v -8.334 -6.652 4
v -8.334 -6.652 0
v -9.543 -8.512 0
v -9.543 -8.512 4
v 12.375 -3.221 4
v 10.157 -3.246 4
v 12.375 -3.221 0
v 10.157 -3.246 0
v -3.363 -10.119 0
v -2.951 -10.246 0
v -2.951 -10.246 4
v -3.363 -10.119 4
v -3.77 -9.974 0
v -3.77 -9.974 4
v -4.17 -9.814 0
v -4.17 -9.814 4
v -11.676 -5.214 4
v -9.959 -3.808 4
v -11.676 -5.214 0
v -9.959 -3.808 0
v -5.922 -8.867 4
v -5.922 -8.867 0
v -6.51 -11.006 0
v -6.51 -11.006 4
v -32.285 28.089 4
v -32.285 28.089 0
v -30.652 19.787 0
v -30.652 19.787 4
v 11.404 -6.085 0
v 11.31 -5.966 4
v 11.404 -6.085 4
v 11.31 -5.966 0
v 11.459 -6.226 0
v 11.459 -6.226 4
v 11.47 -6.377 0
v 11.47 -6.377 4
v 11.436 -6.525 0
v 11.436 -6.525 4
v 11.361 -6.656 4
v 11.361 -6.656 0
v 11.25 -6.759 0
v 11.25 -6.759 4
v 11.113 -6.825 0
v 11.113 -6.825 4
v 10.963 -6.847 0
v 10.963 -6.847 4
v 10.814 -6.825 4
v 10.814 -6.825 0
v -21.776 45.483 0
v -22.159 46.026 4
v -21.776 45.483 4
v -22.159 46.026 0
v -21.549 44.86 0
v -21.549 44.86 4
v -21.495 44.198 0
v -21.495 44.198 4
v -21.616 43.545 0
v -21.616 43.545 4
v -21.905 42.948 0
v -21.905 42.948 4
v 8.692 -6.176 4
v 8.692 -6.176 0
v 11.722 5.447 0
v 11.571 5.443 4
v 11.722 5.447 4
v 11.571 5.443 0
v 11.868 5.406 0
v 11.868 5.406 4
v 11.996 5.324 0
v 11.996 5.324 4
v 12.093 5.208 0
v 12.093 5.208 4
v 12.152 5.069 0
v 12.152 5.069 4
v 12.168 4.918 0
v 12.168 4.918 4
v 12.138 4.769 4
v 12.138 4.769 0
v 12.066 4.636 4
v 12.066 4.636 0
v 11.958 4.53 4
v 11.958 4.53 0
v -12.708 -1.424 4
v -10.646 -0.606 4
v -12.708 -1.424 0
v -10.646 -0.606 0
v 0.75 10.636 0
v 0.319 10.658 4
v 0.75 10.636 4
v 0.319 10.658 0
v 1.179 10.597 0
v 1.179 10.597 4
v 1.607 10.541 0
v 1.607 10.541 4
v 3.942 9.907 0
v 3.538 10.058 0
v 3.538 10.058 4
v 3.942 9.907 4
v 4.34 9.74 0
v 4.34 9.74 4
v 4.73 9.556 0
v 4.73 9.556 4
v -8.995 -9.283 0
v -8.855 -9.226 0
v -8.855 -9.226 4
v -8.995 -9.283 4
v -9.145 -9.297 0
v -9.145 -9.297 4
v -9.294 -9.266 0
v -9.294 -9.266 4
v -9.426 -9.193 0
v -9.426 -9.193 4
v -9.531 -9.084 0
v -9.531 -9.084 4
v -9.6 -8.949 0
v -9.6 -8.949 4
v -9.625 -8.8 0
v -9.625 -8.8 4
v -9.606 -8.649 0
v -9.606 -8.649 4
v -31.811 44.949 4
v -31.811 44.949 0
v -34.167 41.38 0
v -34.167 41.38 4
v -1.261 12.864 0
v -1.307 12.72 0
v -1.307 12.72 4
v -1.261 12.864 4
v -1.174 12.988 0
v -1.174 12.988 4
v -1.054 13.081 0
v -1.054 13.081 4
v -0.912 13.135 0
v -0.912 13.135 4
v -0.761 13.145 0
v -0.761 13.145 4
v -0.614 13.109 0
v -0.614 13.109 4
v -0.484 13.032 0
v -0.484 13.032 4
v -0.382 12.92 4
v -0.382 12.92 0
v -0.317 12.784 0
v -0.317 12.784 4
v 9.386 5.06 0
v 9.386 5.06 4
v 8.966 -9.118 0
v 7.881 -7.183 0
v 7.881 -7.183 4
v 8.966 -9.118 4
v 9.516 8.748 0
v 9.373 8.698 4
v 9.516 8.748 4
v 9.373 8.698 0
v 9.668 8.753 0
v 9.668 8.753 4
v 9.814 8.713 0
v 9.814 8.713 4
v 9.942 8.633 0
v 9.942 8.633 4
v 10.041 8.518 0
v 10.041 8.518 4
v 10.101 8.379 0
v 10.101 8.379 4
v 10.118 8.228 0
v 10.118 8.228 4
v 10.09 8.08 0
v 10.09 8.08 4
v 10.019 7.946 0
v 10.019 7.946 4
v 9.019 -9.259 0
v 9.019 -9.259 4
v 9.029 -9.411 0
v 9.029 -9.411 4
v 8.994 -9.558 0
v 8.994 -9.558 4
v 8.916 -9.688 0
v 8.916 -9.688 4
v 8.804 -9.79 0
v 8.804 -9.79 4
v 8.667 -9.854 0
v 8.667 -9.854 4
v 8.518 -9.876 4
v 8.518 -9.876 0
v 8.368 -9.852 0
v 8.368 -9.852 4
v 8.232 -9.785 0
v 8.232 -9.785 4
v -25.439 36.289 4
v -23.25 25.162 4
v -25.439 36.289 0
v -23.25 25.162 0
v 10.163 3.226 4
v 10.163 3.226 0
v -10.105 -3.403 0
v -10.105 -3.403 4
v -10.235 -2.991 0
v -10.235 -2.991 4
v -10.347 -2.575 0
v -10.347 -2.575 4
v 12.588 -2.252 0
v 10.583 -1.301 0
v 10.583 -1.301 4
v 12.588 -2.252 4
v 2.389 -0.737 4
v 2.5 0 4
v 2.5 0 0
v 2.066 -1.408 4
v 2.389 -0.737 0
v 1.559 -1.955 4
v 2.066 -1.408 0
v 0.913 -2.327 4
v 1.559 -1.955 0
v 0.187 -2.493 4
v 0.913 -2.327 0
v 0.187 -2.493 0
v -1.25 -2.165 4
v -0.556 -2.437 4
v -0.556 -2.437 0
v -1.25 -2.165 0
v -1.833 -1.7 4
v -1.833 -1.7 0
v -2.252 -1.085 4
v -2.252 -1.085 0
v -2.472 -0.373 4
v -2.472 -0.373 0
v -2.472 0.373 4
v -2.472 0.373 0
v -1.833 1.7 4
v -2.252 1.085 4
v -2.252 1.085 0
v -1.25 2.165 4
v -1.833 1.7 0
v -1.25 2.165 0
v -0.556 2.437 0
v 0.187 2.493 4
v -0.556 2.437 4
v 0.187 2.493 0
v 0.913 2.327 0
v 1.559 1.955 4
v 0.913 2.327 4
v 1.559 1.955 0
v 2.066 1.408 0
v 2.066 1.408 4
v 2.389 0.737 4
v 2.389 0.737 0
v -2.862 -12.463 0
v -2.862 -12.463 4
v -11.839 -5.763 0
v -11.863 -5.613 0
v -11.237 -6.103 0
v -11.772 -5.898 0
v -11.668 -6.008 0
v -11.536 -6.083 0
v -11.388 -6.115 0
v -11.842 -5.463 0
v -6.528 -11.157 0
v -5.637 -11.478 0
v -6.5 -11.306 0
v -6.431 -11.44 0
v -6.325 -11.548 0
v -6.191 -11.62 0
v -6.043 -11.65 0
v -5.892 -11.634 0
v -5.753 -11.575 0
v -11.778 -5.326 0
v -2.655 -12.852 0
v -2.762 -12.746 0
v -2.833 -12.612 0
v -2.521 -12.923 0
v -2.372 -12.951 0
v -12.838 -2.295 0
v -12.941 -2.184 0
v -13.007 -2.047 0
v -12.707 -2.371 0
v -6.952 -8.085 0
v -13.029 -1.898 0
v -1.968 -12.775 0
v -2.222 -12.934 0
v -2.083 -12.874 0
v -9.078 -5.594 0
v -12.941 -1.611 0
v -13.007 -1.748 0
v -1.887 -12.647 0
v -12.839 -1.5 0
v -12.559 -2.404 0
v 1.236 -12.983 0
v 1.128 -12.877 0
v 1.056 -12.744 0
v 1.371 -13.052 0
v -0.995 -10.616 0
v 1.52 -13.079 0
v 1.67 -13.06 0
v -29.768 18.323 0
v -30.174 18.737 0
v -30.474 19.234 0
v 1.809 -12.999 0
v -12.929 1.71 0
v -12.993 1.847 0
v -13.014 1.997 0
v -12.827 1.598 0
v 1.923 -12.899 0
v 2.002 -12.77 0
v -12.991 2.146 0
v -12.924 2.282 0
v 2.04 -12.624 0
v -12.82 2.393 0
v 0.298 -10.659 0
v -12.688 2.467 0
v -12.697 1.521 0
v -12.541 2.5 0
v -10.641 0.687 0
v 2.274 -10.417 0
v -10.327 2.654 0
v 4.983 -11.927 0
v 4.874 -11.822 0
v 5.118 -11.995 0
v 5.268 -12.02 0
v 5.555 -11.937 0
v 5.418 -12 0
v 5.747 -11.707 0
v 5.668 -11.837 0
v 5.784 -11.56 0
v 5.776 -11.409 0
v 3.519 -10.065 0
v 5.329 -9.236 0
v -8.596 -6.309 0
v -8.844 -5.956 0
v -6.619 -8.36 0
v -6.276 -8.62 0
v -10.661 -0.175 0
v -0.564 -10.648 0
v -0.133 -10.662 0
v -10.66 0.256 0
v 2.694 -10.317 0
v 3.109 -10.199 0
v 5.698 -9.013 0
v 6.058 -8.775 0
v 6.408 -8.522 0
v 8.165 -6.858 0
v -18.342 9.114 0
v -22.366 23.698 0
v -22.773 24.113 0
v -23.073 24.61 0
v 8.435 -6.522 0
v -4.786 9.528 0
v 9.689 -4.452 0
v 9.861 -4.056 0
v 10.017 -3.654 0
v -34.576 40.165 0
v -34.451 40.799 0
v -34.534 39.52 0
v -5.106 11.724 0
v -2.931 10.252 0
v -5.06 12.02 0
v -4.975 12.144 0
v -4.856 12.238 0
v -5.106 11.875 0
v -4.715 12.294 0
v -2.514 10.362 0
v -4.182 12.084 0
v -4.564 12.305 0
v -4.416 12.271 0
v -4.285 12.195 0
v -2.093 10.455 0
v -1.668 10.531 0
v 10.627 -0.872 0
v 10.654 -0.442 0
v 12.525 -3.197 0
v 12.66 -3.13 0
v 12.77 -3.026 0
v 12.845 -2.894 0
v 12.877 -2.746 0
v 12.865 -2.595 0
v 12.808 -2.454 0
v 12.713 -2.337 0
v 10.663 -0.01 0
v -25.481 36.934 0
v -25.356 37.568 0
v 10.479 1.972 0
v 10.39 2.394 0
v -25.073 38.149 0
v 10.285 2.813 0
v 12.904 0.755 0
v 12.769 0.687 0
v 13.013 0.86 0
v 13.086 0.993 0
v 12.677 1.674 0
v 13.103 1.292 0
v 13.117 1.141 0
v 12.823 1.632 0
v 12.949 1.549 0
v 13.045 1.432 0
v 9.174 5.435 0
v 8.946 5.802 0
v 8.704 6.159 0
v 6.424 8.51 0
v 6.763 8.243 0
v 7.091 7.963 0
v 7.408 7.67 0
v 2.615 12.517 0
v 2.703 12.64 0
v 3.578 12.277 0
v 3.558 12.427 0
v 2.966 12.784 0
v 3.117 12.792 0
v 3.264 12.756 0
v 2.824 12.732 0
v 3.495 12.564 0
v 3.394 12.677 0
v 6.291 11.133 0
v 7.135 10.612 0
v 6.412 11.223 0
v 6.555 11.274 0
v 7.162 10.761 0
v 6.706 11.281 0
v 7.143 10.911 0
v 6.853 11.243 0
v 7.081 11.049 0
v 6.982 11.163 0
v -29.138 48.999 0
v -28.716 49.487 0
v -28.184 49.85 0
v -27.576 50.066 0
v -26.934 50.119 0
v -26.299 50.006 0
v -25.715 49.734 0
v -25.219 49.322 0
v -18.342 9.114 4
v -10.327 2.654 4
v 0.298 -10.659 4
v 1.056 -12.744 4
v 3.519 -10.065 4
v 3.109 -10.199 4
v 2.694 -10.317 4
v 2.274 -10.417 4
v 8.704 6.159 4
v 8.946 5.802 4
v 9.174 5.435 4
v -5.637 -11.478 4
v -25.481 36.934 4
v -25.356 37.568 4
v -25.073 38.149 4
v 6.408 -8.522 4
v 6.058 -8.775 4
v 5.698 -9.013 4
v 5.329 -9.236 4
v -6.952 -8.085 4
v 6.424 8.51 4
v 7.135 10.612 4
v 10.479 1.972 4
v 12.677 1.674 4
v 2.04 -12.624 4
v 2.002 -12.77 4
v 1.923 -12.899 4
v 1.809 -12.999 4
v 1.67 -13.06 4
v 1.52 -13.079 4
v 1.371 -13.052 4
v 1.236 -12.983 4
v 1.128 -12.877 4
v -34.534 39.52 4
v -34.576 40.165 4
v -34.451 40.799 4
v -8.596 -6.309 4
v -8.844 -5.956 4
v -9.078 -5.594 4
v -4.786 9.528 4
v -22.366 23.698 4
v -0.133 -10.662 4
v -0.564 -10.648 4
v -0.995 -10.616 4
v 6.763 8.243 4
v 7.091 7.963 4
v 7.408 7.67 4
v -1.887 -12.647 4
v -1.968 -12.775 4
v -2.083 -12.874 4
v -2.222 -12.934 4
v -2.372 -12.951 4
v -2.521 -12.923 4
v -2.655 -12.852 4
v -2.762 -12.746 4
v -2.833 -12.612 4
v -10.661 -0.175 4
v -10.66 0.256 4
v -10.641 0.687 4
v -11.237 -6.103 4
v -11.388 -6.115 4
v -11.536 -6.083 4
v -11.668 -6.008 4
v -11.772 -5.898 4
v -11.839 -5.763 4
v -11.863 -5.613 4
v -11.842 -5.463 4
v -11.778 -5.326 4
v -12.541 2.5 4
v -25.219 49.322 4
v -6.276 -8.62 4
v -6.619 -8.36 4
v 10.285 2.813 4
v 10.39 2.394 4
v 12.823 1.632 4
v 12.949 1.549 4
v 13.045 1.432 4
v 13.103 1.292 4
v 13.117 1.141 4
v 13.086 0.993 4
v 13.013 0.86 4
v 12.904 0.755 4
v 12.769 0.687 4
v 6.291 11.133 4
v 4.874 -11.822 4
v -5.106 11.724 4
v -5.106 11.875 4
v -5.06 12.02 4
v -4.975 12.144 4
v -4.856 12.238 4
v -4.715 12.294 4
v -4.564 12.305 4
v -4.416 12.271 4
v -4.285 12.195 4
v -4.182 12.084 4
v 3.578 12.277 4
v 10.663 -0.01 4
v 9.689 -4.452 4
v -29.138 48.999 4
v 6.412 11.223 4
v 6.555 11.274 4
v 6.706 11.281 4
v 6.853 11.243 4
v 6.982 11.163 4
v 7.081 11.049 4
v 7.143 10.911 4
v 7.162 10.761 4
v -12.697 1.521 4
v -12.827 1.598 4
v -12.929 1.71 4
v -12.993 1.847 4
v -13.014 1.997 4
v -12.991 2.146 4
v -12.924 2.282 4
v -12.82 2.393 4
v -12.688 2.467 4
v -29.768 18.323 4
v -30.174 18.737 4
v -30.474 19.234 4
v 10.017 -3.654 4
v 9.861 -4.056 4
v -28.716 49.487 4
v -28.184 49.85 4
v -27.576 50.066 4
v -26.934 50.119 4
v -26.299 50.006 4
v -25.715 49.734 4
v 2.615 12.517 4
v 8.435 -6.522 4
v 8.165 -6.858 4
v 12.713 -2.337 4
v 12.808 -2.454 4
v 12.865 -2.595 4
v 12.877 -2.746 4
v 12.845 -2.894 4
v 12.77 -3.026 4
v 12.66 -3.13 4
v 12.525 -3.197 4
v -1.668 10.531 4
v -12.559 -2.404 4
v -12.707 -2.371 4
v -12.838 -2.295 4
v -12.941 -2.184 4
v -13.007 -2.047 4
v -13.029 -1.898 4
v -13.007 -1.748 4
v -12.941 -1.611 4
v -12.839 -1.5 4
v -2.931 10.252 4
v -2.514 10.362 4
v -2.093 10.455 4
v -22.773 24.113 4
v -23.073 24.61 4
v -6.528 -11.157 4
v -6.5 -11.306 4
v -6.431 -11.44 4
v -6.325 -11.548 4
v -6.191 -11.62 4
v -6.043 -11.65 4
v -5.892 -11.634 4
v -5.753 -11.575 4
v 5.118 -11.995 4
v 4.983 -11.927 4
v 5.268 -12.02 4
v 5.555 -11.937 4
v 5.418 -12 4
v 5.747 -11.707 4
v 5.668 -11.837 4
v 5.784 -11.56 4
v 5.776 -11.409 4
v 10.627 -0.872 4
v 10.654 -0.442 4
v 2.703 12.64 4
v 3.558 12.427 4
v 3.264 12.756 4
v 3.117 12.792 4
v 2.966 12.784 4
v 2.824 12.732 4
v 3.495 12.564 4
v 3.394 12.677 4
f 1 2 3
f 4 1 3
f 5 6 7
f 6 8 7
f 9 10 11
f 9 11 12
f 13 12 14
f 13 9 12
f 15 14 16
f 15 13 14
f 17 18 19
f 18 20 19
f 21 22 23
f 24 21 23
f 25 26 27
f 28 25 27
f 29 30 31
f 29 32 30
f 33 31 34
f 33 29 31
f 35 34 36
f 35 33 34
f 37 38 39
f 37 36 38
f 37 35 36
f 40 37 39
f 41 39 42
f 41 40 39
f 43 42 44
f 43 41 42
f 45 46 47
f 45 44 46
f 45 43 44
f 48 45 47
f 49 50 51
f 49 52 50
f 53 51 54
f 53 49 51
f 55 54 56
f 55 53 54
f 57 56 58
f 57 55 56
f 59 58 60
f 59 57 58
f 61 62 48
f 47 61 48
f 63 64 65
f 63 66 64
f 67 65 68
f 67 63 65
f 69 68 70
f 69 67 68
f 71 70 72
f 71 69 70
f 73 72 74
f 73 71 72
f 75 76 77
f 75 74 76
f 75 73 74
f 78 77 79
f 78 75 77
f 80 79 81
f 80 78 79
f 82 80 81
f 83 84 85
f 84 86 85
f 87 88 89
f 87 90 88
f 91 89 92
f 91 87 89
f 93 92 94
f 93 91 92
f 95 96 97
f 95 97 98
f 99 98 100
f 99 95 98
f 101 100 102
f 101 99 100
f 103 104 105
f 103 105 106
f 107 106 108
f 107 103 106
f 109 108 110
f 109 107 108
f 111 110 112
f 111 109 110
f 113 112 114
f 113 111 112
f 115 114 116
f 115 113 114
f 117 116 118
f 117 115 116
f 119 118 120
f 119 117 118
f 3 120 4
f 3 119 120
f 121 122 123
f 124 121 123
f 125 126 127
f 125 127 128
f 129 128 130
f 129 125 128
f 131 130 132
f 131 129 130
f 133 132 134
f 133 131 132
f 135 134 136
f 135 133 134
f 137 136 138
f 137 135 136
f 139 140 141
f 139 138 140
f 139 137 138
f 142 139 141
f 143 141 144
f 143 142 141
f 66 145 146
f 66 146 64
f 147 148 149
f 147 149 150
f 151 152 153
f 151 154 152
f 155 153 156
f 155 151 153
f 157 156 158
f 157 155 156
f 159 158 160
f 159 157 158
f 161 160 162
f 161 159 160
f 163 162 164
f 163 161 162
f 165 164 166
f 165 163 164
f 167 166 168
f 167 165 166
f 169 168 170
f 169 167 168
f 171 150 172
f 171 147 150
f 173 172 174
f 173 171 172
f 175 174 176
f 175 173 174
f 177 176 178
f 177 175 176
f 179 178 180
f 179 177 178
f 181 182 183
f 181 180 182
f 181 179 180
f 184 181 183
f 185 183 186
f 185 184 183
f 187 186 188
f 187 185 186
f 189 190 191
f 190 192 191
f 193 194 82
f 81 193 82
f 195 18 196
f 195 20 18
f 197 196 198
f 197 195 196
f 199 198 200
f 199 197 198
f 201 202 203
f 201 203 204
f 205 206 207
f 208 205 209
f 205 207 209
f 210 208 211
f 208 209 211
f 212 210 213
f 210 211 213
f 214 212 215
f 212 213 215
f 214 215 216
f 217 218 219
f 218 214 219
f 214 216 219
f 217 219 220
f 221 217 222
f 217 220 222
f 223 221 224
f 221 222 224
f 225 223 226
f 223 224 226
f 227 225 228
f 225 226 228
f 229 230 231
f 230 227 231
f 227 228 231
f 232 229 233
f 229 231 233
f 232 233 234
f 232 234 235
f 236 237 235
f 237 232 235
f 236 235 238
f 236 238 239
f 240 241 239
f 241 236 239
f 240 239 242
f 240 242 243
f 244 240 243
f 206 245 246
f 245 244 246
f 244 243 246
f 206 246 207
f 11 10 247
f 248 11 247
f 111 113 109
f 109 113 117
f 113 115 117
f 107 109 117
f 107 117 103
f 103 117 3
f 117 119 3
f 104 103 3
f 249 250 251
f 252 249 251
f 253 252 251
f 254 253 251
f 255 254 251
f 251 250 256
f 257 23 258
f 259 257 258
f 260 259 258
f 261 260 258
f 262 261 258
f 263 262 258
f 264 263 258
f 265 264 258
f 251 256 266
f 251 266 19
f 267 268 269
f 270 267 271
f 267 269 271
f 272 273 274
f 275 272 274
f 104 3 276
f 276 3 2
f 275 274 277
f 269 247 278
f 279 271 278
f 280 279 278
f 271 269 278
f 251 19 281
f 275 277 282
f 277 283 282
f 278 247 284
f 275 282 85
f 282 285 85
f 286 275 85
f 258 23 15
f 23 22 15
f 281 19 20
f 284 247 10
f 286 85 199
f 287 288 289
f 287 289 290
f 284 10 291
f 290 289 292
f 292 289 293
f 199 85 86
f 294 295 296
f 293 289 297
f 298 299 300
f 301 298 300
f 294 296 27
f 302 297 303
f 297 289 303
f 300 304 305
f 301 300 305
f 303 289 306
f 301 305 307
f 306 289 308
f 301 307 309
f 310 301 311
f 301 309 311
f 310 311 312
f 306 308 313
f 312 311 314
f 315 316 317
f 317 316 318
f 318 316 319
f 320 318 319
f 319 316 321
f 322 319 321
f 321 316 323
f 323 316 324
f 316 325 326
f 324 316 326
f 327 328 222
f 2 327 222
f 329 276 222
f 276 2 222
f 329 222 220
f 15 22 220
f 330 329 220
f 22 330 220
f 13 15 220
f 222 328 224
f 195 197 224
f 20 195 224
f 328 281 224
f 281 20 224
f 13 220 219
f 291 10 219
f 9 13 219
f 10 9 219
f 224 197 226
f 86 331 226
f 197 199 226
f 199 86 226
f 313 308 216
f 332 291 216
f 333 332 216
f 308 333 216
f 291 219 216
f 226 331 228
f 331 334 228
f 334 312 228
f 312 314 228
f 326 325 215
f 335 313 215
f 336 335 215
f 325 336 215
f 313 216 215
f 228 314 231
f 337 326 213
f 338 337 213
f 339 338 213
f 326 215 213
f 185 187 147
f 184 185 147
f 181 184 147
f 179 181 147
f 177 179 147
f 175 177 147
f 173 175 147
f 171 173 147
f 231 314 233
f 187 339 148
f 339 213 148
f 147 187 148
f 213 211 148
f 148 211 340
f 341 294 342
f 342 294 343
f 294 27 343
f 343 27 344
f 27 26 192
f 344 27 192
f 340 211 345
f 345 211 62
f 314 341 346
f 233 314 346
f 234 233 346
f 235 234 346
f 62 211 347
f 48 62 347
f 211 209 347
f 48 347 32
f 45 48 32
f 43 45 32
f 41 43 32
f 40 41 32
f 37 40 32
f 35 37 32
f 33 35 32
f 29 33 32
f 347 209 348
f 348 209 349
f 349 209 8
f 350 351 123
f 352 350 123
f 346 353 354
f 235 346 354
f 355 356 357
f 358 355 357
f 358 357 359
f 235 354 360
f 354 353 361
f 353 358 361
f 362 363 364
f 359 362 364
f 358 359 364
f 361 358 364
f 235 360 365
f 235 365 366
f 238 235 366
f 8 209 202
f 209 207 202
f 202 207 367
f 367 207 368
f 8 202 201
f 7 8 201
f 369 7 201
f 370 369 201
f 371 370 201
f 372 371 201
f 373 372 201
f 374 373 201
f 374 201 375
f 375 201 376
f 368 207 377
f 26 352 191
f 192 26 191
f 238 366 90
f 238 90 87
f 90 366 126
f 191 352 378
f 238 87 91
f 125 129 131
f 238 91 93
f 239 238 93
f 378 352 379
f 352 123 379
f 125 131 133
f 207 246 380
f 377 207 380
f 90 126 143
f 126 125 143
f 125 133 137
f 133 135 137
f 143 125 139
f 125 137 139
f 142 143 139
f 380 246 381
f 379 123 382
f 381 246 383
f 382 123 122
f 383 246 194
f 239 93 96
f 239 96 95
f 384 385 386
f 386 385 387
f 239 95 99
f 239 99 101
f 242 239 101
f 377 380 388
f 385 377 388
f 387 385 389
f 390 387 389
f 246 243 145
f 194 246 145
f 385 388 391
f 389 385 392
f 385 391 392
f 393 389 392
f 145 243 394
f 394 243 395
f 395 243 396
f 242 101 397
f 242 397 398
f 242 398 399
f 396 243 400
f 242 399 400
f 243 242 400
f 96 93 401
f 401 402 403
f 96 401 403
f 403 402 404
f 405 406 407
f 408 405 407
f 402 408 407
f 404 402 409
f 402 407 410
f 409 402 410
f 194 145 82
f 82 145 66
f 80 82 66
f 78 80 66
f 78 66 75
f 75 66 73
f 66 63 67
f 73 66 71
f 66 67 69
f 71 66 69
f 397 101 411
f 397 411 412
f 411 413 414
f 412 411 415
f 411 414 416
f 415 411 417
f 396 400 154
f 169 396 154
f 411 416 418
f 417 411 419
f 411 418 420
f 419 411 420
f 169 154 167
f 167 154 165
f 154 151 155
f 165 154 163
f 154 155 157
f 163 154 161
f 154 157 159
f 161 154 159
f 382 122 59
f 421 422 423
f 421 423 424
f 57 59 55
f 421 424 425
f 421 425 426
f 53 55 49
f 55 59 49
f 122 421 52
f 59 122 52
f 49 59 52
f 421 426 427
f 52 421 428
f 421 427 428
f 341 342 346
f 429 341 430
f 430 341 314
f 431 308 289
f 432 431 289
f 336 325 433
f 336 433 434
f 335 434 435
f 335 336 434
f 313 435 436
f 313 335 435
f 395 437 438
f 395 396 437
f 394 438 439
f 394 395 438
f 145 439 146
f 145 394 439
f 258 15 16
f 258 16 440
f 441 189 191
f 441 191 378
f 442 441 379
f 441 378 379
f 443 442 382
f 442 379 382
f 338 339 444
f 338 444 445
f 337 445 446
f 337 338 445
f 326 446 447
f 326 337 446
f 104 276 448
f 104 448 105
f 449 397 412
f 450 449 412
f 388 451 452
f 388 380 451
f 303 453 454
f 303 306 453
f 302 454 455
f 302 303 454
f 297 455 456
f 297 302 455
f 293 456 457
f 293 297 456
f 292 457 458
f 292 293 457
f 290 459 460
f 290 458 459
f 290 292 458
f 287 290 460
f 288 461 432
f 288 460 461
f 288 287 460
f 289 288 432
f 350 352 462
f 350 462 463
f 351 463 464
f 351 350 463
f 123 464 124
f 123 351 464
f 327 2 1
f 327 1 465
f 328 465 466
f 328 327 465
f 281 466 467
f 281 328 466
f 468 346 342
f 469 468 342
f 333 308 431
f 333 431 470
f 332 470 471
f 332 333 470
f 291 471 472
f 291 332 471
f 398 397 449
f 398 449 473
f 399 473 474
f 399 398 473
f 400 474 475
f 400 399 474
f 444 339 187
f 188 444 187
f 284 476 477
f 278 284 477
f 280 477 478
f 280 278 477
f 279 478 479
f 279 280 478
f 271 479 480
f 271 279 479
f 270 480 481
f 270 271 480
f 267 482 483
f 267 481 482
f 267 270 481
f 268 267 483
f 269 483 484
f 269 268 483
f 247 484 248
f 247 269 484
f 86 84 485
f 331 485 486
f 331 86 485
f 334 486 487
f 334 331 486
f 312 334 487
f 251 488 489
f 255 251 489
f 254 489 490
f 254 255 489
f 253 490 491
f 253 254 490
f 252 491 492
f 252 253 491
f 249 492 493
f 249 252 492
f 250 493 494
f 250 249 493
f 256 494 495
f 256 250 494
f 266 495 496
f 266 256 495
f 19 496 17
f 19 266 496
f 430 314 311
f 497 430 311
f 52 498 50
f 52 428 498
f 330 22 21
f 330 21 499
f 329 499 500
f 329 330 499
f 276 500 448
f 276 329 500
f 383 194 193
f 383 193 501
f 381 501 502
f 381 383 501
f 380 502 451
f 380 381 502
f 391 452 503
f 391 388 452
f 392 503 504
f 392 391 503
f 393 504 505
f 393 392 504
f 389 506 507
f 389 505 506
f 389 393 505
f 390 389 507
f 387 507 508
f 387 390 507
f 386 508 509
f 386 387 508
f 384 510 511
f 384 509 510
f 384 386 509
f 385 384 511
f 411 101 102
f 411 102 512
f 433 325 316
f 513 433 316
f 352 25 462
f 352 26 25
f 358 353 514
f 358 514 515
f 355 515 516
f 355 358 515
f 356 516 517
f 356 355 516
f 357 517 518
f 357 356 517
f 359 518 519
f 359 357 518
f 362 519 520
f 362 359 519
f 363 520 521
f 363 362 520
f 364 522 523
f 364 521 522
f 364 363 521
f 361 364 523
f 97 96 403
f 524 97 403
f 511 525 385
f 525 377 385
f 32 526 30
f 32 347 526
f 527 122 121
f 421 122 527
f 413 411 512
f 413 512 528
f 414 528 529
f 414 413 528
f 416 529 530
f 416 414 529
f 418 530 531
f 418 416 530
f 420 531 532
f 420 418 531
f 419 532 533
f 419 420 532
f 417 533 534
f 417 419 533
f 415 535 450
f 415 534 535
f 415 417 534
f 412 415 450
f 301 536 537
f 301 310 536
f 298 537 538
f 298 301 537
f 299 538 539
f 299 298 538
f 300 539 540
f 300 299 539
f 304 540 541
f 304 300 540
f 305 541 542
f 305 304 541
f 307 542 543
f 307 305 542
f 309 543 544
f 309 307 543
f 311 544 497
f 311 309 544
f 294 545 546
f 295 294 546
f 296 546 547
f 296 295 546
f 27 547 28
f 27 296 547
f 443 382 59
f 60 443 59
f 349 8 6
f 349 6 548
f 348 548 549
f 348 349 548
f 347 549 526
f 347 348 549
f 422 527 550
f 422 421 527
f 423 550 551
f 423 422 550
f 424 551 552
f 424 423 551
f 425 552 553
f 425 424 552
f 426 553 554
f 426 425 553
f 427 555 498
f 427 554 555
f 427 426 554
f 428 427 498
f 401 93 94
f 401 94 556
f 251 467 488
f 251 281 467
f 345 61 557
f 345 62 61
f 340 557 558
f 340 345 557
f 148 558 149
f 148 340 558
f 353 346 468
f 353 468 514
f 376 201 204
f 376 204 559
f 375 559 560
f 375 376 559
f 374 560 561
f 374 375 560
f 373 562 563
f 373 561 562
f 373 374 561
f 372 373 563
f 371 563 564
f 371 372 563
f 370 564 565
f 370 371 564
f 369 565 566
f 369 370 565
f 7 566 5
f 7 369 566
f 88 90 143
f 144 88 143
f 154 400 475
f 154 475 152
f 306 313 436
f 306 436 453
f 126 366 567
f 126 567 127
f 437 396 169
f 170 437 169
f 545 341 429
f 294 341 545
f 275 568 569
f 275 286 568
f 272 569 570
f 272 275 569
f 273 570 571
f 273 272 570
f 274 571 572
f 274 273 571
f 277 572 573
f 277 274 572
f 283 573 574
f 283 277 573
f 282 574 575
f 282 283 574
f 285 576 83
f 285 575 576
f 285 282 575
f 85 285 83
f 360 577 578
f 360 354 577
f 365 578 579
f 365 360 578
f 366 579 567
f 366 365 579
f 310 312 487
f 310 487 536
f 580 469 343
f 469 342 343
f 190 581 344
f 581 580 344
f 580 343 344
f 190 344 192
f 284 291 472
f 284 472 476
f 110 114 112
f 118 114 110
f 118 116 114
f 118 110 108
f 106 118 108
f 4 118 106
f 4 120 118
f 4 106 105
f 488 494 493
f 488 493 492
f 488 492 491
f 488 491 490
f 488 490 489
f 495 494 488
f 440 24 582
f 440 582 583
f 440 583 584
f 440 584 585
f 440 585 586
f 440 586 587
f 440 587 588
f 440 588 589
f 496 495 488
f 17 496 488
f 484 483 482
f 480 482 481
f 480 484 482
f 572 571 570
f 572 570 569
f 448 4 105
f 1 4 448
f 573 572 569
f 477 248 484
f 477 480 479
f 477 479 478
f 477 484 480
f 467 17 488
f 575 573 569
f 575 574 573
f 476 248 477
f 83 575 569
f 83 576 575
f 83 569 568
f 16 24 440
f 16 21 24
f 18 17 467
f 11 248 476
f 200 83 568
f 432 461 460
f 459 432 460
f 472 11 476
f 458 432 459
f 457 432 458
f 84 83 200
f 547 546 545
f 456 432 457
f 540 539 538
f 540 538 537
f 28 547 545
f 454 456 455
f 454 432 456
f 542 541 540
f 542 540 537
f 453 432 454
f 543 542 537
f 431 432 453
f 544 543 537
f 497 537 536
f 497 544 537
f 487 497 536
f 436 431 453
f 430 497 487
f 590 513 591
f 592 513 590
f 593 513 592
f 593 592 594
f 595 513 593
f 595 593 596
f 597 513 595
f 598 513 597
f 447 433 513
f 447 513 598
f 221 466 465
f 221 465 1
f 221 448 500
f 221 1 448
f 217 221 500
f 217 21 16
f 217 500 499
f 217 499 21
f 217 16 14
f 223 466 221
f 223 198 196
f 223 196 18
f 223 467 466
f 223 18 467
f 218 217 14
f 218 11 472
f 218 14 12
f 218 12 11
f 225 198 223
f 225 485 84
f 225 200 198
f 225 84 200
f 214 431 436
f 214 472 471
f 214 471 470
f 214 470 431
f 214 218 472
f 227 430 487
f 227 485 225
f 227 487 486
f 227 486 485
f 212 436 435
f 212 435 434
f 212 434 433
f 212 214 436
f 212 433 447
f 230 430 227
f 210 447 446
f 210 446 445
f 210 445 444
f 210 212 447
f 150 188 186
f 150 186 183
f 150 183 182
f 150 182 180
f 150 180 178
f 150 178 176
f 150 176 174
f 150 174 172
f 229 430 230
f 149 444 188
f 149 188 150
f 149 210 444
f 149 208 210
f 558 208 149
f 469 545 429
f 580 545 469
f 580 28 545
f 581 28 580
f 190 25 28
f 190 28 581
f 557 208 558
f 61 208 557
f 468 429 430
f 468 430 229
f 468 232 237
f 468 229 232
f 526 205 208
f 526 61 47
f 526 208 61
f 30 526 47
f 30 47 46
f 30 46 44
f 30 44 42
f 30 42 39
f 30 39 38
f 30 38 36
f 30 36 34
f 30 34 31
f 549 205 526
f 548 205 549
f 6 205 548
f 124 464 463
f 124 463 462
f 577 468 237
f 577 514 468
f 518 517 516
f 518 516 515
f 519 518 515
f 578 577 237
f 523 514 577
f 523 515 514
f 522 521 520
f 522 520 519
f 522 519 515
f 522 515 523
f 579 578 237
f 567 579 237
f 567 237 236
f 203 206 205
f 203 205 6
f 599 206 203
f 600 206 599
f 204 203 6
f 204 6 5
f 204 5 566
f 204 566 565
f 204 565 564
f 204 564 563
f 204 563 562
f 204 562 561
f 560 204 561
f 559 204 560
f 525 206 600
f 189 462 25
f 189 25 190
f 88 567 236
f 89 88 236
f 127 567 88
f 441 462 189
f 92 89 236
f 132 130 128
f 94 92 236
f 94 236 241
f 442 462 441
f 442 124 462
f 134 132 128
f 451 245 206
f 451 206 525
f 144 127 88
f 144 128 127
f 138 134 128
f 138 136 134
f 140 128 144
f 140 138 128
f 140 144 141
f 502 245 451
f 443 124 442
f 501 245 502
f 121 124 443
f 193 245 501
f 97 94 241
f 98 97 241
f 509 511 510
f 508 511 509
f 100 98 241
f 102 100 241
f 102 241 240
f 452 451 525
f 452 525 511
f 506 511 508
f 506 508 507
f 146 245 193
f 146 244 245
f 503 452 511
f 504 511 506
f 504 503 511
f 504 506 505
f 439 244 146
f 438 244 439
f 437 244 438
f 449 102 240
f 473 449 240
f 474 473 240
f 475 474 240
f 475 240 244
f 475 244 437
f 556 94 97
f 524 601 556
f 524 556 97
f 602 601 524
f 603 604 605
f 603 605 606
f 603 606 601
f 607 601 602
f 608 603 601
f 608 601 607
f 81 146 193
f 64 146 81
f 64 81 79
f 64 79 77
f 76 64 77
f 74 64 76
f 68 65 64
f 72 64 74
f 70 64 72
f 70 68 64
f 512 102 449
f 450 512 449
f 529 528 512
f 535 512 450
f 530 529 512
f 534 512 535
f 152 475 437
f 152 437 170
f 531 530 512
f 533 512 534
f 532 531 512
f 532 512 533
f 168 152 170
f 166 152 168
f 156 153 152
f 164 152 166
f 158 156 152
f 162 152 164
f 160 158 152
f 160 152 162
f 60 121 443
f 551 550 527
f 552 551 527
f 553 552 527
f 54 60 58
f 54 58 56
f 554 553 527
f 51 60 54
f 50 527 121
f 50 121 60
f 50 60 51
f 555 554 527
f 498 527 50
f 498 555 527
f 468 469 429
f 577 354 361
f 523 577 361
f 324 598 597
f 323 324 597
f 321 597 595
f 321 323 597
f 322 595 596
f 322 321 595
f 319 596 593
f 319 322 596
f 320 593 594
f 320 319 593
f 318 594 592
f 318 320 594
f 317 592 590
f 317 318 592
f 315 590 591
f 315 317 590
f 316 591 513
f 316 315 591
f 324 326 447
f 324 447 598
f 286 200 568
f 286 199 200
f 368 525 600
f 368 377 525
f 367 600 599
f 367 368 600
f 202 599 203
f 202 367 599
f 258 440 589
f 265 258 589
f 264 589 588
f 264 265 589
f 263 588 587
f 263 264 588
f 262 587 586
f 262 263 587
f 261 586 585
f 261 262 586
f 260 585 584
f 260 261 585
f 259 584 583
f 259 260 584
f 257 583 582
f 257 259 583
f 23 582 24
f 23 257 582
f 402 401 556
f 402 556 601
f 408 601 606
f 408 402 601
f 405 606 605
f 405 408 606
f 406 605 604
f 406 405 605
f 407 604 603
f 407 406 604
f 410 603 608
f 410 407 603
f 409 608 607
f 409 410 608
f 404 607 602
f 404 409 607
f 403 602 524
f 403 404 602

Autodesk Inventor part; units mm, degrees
ref_plane "YZ Plane" through (0, 0, 0) normal (1, 0, 0) x (0, 1, 0)
ref_plane "XZ Plane" through (0, 0, 0) normal (0, 1, 0) x (-1, 0, 0)
ref_plane "XY Plane" through (0, 0, 0) normal (0, 0, 1) x (1, 0, 0)
sketch "Sketch1" plane through (0, 0, 0) normal (0, 0, 1) x (1, 0, 0)
  circle A0 centre (0, 0) radius 2.5
  line L0 (0, 0) -> (-15.5714, 12.5511)
  line L1 (0, 0) -> (20, 0) construction
  line L2 (-15.5714, 12.5511) -> (-18.3421, 9.1137)
  line L3 (0, 0) -> (-10.3273, 2.6535)
  line L4 (0, 0) -> (22.7557, 0) construction
  line L5 (0, 0) -> (-10.6628, 0)
  line L6 (-4.786, 9.5283) -> (-22.3661, 23.6985)
  line L7 (-22.3661, 23.6985) -> (-20.7973, 25.6449)
  circle A1 centre (-20.7973, 25.6449) radius 2.5
  line L8 (-18.3421, 9.1137) -> (-10.3273, 2.6535)
  line L9 (-23.2502, 25.1624) -> (-25.4393, 36.2891)
  line L10 (-23.2502, 25.1624) -> (-11.9102, 25.1624) construction
  line L11 (-25.4393, 36.2891) -> (-22.9863, 36.7717)
  circle A2 centre (-22.9863, 36.7717) radius 2.5
  line L12 (-25.0727, 38.149) -> (-21.9049, 42.9477)
  line L13 (-25.0727, 38.149) -> (-19.3227, 38.149) construction
  line L14 (-21.9049, 42.9477) -> (-23.9913, 44.325)
  circle A3 centre (-23.9913, 44.325) radius 2.5
  line L15 (0, 0) -> (60, 0) construction
  line L16 (-25.2189, 49.3225) -> (-22.1589, 46.0257)
  line L17 (-23.9913, 39.7871) -> (-31.8111, 44.9492)
  line L18 (-31.8111, 44.9492) -> (-29.1376, 48.9991)
  line L19 (-31.8111, 44.9492) -> (-34.1674, 41.3798)
  line L20 (-24.1412, 29.6912) -> (-32.2851, 28.089)
  line L21 (-32.2851, 28.089) -> (-34.534, 39.5199)
  line L22 (-32.2851, 28.089) -> (-30.6518, 19.787)
  line L23 (-18.3421, 9.1137) -> (-29.7677, 18.3232)
  line L24 (-18.3421, 20.455) -> (-23.8834, 13.5802)
  arc A4 (-12.5406, 2.5003) -> (-12.6967, 1.5208) centre (-12.5054, 1.9925) ccw
  line L25 (-10.3273, 2.6535) -> (-12.5406, 2.5003)
  line L26 (-10.6406, 0.6873) -> (-12.6967, 1.5208)
  line L27 (-10.6455, -0.6061) -> (-12.7079, -1.4239)
  line L28 (-10.3473, -2.5746) -> (-12.5593, -2.4045)
  arc A5 (-12.7079, -1.4239) -> (-12.5593, -2.4045) centre (-12.5203, -1.897) ccw
  line L29 (-9.9594, -3.8085) -> (-11.6763, -5.2137)
  line L30 (-9.0777, -5.5937) -> (-11.2371, -6.103)
  arc A6 (-11.6763, -5.2137) -> (-11.2371, -6.103) centre (-11.3539, -5.6076) ccw
  line L31 (-8.3337, -6.6517) -> (-9.5431, -8.5116)
  line L32 (-6.9518, -8.085) -> (-8.8547, -9.2257)
  arc A7 (-9.5431, -8.5116) -> (-8.8547, -9.2257) centre (-9.1164, -8.7891) ccw
  line L33 (-5.9217, -8.8672) -> (-6.5096, -11.0065)
  line L34 (-4.17, -9.8136) -> (-5.6369, -11.478)
  arc A8 (-6.5096, -11.0065) -> (-5.6369, -11.478) centre (-6.0188, -11.1414) ccw
  line L35 (-2.951, -10.2463) -> (-2.8619, -12.4631)
  line L36 (-0.9947, -10.6163) -> (-1.8873, -12.6474)
  arc A9 (-2.8619, -12.4631) -> (-1.8873, -12.6474) centre (-2.3533, -12.4426) ccw
  line L37 (0.298, -10.6586) -> (1.0558, -12.7438)
  line L38 (2.2743, -10.4174) -> (2.0403, -12.6236)
  arc A10 (1.0558, -12.7438) -> (2.0403, -12.6236) centre (1.5342, -12.5699) ccw
  line L39 (3.5189, -10.0654) -> (4.8738, -11.8222)
  line L40 (5.3288, -9.2357) -> (5.7755, -11.4089)
  arc A11 (4.8738, -11.8222) -> (5.7755, -11.4089) centre (5.2769, -11.5113) ccw
  line L41 (6.4079, -8.5225) -> (8.2321, -9.7852)
  line L42 (7.8806, -7.1827) -> (8.9658, -9.1178)
  arc A12 (8.2321, -9.7852) -> (8.9658, -9.1178) centre (8.5218, -9.3667) ccw
  line L43 (8.6923, -6.1756) -> (10.8137, -6.8251)
  line L44 (9.6889, -4.452) -> (11.3102, -5.9665)
  arc A13 (10.8137, -6.8251) -> (11.3102, -5.9665) centre (10.9627, -6.3384) ccw
  line L45 (10.1566, -3.2461) -> (12.3751, -3.2211)
  line L46 (10.5831, -1.3013) -> (12.5875, -2.2522)
  arc A14 (12.3751, -3.2211) -> (12.5875, -2.2522) centre (12.3693, -2.7121) ccw
  line L47 (10.6628, -0.0103) -> (12.769, 0.6868)
  line L48 (10.4788, 1.9721) -> (12.6773, 1.6744)
  arc A15 (12.769, 0.6868) -> (12.6773, 1.6744) centre (12.609, 1.17) ccw
  line L49 (10.1629, 3.2264) -> (11.9582, 4.5299)
  line L50 (9.3859, 5.0595) -> (11.5711, 5.4432)
  arc A16 (11.9582, 4.5299) -> (11.5711, 5.4432) centre (11.6591, 4.9418) ccw
  line L51 (8.7043, 6.1588) -> (10.0192, 7.9457)
  line L52 (7.4075, 7.6696) -> (9.3732, 8.6983)
  arc A17 (10.0192, 7.9457) -> (9.3732, 8.6983) centre (9.6092, 8.2474) ccw
  line L53 (6.4244, 8.5101) -> (7.135, 10.6118)
  line L54 (4.7303, 9.5561) -> (6.291, 11.1329)
  arc A18 (7.135, 10.6118) -> (6.291, 11.1329) centre (6.6528, 10.7748) ccw
  line L55 (3.5385, 10.0585) -> (3.5776, 12.2768)
  line L56 (1.6068, 10.541) -> (2.6153, 12.5171)
  arc A19 (3.5776, 12.2768) -> (2.6153, 12.5171) centre (3.0687, 12.2857) ccw
  line L57 (0.3187, 10.658) -> (-0.3173, 12.7835)
  line L58 (-1.6683, 10.5314) -> (-1.3071, 12.7204)
  arc A20 (-0.3173, 12.7835) -> (-1.3071, 12.7204) centre (-0.8049, 12.6376) ccw
  line L59 (-2.9312, 10.252) -> (-4.1823, 12.0842)
  line L60 (-4.786, 9.5283) -> (-5.1063, 11.7237)
  arc A21 (-4.1823, 12.0842) -> (-5.1063, 11.7237) centre (-4.6026, 11.7971) ccw
  arc A22 (-1.6683, 10.5314) -> (-2.9312, 10.252) centre (0, 0) ccw
  arc A23 (1.6068, 10.541) -> (0.3187, 10.658) centre (0, 0) ccw
  arc A24 (4.7303, 9.5561) -> (3.5385, 10.0585) centre (0, 0) ccw
  arc A25 (7.4075, 7.6696) -> (6.4244, 8.5101) centre (0, 0) ccw
  arc A26 (9.3859, 5.0595) -> (8.7043, 6.1588) centre (0, 0) ccw
  arc A27 (10.4788, 1.9721) -> (10.1629, 3.2264) centre (0, 0) ccw
  arc A28 (10.5831, -1.3013) -> (10.6628, 0) centre (0, 0) ccw
  arc A29 (9.6889, -4.452) -> (10.1566, -3.2461) centre (0, 0) ccw
  arc A30 (7.8806, -7.1827) -> (8.6923, -6.1756) centre (0, 0) ccw
  arc A31 (5.3288, -9.2357) -> (6.4079, -8.5225) centre (0, 0) ccw
  arc A32 (2.2743, -10.4174) -> (3.5189, -10.0654) centre (0, 0) ccw
  arc A33 (-0.9947, -10.6163) -> (0.298, -10.6586) centre (0, 0) ccw
  arc A34 (-4.17, -9.8136) -> (-2.951, -10.2463) centre (0, 0) ccw
  arc A35 (-6.9518, -8.085) -> (-5.9217, -8.8672) centre (0, 0) ccw
  arc A36 (-9.0777, -5.5937) -> (-8.3337, -6.6517) centre (0, 0) ccw
  arc A37 (-10.3473, -2.5746) -> (-9.9594, -3.8085) centre (0, 0) ccw
  arc A38 (-10.2331, 2.9964) -> (-10.3273, 2.6535) centre (0, 0) ccw
  arc A39 (-10.6406, 0.6873) -> (-10.6455, -0.6061) centre (0, 0) ccw
  line L61 (-4.9971, 9.2664) -> (-4.786, 9.5283)
  arc A40 (-25.2189, 49.3225) -> (-29.1376, 48.9991) centre (-27.0512, 47.6218) ccw
  arc A41 (-34.1674, 41.3798) -> (-34.534, 39.5199) centre (-32.081, 40.0025) ccw
  arc A42 (-30.6518, 19.787) -> (-29.7677, 18.3232) centre (-28.1988, 20.2696) ccw
  point P0 (-4.786, 9.5283)
  dimension "d0" = 5
  dimension "d1" = 20
  dimension "d2" = 141.13
  dimension "d3" = 4.415
  dimension "d4" = 165.59
  dimension "d5" = 22.58
  dimension "d6" = 2.5
  dimension "d10" = 11.34
  dimension "d12" = 101.13
  dimension "d13" = 2.5
  dimension "d15" = 5.75
  dimension "d17" = 56.57
  dimension "d18" = 2.5
  dimension "d22" = 9.37
  dimension "d23" = 8.3
  dimension "d24" = 8.83
  dimension "d25" = 1.991
  dimension "d27" = 1.018
  dimension "d30" = 300.366
  dimension "d32" = 2.5
extrude "Extrusion1" add sketch "Sketch1" along normal blind 4 contours A0 L0 L2 L23 L24 L6 L60 A21 L59 A22 L58 A20 L57 A23 L56 A19 L55 A24 L54 A18 L53 A25 L52 A17 L51 A26 L50 A16 L49 A27 L48 A15 L47 A28 L46 A14 L45 A29 L44 A13 L43 A30 L42 A12 L41 A31 L40 A11 L39 A32 L38 A10 L37 A33 L36 A9 L35 A34 L34 A8 L33 A35 L32 A7 L31 A36 L30 A6 L29 A37 L28 A5 L27 A39 L5 | A0 L3 L8 L2 L0 | L5 A39 L26 A4 L25 L3 A0 | L23 A42 L22 L20 L9 A1 L6 L24 | L21 A41 L19 L17 L12 A2 L9 L20 | L18 A40 L16 A3 L12 L17 | A3
properties part number "Servo pinza 1"
